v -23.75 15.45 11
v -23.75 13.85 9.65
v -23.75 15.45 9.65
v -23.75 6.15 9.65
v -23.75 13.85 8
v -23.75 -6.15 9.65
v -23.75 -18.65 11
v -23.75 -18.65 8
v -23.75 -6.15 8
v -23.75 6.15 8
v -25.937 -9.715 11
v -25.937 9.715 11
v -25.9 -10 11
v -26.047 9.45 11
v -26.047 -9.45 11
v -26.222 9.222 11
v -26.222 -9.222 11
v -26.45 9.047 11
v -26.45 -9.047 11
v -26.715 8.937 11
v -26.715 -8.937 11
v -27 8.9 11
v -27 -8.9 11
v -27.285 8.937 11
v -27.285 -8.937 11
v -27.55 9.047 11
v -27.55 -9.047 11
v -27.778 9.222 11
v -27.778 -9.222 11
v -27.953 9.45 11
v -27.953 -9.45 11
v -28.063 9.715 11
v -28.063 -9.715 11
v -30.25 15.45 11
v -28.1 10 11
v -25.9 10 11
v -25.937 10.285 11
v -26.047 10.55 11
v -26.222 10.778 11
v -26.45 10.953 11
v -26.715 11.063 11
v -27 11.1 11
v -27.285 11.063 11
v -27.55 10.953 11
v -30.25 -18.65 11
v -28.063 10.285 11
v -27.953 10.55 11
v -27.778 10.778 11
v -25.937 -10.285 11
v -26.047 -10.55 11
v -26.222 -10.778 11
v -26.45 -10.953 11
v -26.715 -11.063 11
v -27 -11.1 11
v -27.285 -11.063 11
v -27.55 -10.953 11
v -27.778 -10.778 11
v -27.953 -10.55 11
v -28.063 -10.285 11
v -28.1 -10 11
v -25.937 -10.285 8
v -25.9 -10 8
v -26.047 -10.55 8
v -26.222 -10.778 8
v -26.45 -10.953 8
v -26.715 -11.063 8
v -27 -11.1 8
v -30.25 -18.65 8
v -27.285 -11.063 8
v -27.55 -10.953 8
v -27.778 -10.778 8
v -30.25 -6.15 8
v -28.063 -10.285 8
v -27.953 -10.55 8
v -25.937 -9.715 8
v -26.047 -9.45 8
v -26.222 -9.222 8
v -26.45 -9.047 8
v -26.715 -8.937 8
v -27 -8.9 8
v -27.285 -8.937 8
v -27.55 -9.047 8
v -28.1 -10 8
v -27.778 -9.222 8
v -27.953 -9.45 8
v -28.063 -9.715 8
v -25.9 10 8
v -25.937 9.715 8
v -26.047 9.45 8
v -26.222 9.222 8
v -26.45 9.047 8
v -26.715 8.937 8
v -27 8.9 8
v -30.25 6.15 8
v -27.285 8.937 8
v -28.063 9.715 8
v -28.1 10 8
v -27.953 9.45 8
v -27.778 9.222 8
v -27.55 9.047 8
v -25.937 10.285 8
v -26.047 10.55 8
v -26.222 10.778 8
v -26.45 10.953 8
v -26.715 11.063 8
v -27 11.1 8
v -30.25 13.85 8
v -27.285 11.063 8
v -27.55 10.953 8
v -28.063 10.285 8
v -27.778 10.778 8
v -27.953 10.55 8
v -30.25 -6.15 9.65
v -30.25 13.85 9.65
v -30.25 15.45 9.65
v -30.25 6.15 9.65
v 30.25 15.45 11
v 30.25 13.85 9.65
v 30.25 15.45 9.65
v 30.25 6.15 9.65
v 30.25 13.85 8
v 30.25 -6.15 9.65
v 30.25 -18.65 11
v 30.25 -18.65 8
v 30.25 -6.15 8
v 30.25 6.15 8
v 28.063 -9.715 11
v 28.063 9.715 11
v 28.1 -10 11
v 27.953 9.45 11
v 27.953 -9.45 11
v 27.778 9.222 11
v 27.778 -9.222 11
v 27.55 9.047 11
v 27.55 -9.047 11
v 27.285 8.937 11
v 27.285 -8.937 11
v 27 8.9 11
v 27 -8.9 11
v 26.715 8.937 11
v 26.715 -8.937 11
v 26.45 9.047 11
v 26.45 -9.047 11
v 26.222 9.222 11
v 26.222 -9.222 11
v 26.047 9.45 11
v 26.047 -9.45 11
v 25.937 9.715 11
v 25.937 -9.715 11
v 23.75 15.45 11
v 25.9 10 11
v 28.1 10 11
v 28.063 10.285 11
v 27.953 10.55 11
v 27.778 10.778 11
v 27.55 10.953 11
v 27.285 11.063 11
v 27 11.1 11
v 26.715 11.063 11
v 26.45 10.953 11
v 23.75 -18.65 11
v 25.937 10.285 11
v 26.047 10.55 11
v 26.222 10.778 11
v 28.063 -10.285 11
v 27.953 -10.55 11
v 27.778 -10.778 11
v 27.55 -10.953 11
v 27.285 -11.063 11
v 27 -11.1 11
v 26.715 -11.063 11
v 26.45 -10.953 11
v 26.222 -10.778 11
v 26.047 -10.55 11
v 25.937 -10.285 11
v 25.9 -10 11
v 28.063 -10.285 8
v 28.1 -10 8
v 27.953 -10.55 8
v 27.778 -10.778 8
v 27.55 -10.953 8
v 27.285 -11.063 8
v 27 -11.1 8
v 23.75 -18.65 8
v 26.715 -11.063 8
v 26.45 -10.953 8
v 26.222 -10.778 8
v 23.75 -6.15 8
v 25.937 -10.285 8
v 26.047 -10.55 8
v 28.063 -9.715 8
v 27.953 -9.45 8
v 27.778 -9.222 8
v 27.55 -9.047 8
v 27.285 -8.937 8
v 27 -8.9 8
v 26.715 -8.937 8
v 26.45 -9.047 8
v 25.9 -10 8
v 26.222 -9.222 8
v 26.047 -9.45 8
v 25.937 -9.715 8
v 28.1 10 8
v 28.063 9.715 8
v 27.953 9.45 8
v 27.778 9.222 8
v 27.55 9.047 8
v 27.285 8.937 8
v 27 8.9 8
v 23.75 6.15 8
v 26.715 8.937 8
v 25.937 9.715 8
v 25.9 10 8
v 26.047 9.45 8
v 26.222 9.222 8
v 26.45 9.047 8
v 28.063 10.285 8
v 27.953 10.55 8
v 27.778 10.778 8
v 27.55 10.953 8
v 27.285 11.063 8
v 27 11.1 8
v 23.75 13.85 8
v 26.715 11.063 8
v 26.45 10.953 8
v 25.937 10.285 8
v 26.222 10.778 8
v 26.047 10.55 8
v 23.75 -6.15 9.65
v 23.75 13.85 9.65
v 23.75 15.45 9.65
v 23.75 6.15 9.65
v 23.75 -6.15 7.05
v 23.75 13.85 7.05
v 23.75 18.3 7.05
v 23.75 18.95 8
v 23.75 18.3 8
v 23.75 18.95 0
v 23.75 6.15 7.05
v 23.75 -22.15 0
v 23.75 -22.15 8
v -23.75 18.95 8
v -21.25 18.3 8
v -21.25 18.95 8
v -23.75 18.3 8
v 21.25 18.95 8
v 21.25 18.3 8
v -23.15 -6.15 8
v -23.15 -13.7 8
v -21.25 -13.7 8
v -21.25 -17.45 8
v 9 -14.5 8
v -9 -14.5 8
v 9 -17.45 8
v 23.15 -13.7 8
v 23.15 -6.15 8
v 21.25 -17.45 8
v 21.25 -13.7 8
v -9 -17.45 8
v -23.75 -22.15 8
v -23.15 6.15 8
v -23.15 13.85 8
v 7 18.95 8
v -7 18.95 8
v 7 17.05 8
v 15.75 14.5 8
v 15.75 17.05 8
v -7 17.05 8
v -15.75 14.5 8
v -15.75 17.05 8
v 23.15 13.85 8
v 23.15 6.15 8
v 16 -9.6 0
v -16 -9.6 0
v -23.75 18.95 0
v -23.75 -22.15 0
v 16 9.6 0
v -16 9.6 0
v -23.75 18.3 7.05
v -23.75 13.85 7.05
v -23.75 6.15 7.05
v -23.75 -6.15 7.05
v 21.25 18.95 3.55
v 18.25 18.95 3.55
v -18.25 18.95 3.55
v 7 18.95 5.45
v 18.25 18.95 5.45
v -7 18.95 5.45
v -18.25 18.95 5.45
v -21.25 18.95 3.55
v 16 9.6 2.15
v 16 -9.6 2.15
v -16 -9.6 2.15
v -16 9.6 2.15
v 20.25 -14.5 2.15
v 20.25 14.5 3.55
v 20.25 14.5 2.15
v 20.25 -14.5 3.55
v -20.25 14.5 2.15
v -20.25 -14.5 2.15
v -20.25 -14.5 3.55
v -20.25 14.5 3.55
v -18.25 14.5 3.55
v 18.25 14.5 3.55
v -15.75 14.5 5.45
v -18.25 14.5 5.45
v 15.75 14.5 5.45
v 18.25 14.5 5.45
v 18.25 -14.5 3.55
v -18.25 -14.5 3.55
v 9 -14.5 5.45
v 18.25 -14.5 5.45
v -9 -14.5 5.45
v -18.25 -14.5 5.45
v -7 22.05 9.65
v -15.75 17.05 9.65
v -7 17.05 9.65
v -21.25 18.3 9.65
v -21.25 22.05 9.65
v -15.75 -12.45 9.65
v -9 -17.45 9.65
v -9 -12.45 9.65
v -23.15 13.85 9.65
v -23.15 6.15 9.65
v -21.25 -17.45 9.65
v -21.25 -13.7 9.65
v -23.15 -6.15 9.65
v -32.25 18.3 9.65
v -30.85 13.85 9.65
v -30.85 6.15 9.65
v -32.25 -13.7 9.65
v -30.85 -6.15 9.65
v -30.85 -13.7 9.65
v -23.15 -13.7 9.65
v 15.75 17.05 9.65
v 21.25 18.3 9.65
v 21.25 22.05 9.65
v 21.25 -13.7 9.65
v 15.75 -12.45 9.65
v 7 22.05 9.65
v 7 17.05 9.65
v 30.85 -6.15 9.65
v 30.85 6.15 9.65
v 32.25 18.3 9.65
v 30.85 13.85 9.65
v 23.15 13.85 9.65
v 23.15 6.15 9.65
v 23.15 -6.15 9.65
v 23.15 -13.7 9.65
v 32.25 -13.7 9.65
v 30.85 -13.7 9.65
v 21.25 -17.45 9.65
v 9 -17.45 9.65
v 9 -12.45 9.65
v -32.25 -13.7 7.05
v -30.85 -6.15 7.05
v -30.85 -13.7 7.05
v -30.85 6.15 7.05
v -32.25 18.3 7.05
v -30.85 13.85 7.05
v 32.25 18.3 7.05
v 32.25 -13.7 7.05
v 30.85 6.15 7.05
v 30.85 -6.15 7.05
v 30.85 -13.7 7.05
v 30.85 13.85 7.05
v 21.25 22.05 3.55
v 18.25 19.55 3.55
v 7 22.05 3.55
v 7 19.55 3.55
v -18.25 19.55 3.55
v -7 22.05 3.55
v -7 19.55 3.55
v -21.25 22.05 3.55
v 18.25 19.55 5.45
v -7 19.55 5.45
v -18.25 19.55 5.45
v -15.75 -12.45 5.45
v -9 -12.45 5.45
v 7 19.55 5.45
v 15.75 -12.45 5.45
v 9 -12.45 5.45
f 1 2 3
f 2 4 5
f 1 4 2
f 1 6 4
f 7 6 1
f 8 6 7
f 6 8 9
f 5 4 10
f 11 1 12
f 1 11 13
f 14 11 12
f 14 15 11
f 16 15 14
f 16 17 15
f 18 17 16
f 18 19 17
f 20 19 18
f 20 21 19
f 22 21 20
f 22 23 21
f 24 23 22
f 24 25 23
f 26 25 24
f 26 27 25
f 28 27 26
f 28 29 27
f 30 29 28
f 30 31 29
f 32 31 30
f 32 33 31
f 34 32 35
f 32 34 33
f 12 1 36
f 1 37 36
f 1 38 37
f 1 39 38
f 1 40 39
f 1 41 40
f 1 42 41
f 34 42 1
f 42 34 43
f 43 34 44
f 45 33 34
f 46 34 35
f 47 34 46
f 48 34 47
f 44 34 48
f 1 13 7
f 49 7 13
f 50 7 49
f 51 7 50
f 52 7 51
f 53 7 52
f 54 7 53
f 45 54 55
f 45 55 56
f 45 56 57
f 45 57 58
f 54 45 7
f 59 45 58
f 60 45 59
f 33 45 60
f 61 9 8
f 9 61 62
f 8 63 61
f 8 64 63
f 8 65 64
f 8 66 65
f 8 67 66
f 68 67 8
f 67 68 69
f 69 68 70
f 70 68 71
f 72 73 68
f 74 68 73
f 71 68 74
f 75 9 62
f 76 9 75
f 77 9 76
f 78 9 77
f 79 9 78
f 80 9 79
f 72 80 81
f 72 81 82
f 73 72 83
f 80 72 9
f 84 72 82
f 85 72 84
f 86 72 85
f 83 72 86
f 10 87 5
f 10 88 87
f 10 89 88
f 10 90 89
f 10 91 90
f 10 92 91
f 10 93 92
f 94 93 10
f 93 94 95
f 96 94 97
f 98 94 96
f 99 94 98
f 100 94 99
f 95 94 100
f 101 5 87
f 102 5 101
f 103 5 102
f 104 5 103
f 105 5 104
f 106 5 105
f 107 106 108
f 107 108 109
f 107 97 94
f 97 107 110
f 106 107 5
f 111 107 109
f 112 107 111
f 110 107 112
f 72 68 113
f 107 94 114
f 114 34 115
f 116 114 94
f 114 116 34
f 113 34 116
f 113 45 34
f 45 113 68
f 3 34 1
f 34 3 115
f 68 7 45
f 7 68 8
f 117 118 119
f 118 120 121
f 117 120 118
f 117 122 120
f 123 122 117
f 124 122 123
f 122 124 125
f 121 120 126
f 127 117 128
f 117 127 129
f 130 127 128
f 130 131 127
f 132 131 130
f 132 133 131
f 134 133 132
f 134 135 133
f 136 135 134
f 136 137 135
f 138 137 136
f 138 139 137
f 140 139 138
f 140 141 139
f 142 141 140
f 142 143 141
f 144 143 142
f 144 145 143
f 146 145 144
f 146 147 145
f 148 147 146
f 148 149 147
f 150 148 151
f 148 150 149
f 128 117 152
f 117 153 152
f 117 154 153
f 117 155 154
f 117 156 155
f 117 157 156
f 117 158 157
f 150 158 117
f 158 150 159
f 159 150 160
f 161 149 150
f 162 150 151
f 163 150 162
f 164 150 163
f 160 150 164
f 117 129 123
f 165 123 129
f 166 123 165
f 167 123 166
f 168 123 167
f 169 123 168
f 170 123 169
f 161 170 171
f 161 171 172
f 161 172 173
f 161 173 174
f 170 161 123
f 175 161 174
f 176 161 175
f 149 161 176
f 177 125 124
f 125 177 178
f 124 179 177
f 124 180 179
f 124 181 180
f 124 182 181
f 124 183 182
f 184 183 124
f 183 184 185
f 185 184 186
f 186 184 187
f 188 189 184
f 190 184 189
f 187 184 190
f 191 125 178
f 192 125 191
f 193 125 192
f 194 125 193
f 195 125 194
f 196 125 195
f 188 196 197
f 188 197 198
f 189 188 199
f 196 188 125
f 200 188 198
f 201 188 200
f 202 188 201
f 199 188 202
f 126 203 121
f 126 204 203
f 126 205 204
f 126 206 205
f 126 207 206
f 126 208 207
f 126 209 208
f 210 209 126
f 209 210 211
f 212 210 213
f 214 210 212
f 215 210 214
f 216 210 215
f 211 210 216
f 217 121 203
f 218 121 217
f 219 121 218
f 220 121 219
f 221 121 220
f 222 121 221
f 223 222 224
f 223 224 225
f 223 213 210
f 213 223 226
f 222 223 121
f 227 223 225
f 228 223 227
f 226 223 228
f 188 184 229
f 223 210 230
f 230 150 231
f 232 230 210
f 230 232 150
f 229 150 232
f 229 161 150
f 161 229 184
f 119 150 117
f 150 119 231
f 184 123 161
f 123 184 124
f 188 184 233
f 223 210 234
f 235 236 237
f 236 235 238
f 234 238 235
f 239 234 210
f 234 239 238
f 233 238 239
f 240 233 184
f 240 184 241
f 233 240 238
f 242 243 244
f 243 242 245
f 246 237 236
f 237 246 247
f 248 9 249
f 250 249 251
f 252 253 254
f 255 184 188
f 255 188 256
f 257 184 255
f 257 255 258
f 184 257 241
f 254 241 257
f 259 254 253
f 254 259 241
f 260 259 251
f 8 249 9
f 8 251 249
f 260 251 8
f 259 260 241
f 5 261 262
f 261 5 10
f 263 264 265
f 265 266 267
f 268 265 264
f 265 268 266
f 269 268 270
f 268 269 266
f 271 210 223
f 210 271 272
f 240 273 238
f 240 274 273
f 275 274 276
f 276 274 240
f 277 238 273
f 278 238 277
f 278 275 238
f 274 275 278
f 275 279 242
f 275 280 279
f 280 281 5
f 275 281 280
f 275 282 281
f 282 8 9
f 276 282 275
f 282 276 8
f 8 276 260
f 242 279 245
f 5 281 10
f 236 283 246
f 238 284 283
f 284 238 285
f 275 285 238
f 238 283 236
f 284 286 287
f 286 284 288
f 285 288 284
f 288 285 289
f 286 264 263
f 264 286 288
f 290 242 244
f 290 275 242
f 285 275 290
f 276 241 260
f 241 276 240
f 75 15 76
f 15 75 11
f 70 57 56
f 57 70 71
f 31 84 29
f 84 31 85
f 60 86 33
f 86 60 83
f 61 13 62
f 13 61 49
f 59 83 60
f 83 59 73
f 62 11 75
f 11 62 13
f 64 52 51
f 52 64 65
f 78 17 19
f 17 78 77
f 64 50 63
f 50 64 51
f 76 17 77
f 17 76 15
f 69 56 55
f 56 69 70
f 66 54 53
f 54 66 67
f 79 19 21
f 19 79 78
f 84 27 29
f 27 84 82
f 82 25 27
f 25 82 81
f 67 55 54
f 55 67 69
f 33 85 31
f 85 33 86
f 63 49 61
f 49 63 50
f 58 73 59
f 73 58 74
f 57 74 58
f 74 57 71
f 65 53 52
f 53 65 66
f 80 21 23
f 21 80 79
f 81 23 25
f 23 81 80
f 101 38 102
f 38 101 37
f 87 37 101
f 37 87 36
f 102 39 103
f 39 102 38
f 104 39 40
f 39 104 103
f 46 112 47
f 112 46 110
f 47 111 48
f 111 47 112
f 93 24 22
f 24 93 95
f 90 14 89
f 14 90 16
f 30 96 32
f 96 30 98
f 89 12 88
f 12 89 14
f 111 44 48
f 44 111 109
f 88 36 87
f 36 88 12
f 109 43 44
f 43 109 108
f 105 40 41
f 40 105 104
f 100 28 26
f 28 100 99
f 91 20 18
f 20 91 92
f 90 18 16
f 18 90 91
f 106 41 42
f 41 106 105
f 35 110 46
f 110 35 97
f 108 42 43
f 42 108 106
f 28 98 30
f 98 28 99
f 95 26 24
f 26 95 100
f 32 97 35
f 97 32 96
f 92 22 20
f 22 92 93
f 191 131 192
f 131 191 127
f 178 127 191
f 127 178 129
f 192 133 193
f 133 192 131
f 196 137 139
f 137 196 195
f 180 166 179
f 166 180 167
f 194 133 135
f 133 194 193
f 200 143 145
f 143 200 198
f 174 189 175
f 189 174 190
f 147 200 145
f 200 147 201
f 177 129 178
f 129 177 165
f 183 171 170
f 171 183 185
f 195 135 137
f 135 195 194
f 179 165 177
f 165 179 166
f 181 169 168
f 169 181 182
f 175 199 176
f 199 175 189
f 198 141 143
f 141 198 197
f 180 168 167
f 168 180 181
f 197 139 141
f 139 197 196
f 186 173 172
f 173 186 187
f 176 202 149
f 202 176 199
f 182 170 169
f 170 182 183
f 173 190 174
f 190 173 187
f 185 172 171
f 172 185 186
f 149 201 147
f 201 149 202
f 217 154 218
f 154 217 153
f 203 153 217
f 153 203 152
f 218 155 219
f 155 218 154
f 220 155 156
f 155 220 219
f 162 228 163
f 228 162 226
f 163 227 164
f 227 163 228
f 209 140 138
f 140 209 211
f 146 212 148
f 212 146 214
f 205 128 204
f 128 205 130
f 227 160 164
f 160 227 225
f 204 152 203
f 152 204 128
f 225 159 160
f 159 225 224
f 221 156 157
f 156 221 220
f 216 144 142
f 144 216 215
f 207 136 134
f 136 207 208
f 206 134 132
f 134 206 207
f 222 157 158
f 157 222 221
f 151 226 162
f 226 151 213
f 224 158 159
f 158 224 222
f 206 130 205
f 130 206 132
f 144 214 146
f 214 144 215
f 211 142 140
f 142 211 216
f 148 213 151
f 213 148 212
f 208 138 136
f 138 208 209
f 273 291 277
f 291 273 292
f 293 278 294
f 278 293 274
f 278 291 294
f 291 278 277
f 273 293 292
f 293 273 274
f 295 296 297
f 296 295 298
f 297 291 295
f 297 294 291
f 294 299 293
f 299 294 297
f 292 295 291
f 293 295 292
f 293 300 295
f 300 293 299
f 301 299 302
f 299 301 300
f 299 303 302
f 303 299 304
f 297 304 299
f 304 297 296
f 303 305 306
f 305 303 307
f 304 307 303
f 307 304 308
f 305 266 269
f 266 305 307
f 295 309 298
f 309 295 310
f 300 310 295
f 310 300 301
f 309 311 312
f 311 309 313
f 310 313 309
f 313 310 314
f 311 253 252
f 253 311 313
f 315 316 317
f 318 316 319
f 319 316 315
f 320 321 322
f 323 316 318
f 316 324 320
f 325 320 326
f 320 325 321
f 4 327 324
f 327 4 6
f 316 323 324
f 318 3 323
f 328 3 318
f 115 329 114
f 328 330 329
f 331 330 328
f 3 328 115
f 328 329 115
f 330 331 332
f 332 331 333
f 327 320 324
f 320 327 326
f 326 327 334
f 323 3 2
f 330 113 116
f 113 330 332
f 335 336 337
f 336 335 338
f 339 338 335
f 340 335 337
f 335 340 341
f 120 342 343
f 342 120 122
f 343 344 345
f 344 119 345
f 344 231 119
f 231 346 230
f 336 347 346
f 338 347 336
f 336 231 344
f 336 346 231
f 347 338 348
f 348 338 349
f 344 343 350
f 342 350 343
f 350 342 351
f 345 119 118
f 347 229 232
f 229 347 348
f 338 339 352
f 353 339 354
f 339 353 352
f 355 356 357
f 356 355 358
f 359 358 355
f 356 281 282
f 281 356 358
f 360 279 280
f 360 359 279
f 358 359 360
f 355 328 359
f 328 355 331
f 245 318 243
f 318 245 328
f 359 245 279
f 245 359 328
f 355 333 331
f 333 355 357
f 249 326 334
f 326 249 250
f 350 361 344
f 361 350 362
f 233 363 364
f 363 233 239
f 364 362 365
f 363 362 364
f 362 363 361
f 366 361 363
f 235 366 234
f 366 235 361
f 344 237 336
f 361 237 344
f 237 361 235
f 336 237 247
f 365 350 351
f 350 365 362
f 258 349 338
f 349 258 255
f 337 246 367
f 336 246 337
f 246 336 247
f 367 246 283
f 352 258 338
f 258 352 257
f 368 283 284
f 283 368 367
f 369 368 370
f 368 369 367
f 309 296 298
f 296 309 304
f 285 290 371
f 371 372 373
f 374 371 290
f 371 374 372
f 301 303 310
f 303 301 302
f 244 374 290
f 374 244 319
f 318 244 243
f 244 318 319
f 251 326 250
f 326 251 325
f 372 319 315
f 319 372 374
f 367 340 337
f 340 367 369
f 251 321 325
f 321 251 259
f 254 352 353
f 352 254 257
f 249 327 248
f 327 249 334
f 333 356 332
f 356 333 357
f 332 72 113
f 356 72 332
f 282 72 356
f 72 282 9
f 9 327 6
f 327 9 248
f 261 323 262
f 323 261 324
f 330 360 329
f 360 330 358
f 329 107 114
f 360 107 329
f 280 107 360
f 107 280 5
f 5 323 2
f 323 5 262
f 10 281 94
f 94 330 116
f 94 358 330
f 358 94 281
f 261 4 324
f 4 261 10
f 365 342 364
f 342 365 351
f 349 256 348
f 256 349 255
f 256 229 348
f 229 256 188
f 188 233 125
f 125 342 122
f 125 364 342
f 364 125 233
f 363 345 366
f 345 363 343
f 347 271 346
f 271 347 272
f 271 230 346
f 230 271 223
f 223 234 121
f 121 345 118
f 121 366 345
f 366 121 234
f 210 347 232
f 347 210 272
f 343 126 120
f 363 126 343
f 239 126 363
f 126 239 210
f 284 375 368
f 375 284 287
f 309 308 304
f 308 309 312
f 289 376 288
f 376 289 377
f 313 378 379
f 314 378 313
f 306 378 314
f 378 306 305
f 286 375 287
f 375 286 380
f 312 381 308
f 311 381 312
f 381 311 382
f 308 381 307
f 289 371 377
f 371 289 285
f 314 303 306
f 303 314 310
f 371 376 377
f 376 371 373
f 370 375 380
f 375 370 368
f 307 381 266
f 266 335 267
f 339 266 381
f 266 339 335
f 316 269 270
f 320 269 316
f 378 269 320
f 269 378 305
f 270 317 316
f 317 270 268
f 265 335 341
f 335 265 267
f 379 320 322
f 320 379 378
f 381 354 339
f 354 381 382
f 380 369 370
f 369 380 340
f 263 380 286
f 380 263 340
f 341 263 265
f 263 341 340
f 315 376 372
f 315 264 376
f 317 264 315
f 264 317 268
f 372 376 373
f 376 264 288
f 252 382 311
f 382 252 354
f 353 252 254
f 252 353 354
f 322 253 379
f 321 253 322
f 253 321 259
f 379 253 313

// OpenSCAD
// =============================================================================
// JARVIS LEGO BOT — FASE D: Prototipo Parametrico Supporto OLED Binghe 1,3"
// Soluzione 2B: Cornice frontale sottile (1,8 mm) + Culla posteriore regolabile
// STATO: PROTOTIPO PARAMETRICO NON VALIDATO (quote provvisorie da confermare)
// =============================================================================

// Seleziona parte da esportare: "assembly", "bezel", "cradle"
part = "assembly";

// --- 1. PARAMETRI PCB (Provvisori: tollera Rev.A 35.4x33.5 e Rev.B 36.0x34.0) ---
pcb_w_min = 35.40;          // [mm] Rev.A (disegno tecnico recente)
pcb_w_max = 36.00;          // [mm] Rev.B (inserzione commerciale)
pcb_h_min = 33.50;          // [mm] Rev.A
pcb_h_max = 34.00;          // [mm] Rev.B
pcb_thickness = 1.60;       // [mm] PROVVISORIO (da confermare con calibro)
rear_smd_protrusion = 2.00; // [mm] PROVVISORIO (componenti SMD retro PCB; NON i 11.30 mm totali!)

// --- 2. PARAMETRI VETRO & AREA ATTIVA ---
glass_w = 34.50;            // [mm]
glass_h = 23.00;            // [mm]
glass_thickness = 1.40;     // [mm] PROVVISORIO
active_w = 29.42;           // [mm] (128 px)
active_h = 14.70;           // [mm] (64 px)
active_top_offset = 7.35;   // [mm] da bordo superiore PCB (asimmetrico -> centro area a 14.70 mm)

// --- 3. PARAMETRI FORI PCB (solo riferimento, NON usati per incastro rigido) ---
hole_pitch_x_min = 30.40;   // [mm] Rev.A
hole_pitch_x_max = 31.00;   // [mm] Rev.B
hole_pitch_y = 28.50;       // [mm] Rev.A
hole_dia = 3.00;            // [mm]

// --- 4. PARAMETRI CORNICE & FINESTRA LEGO (Soluzione 2B) ---
pocket_w = 48.00;           // [mm] Tasca LEGO frontale (6 stud)
pocket_h = 41.60;           // [mm] Tasca LEGO frontale (13 plate: Y_h = 25.6..67.2 mm)
lego_wall_z = 8.00;         // [mm] Spessore parete LEGO (1 stud)
window_w = 32.00;           // [mm] Finestra netta visibile (invariata)
window_h = 19.20;           // [mm] Finestra netta visibile (invariata)
recess_depth = 1.80;        // [mm] Incasso frontale nominale pannello
glass_relief = 0.35;        // [mm] Scarico aria davanti al vetro (nessuna pressione!)

// --- 5. PARAMETRI STAMPA 3D & REGOLAZIONE CULLA ---
print_tol_xy = 0.25;        // [mm] Gioco FDM XY per lato
print_tol_z = 0.20;         // [mm] Gioco Z
slot_travel = 2.50;         // [mm] Corsa di regolazione fine ±2.5 mm su X e Y
screw_dia = 2.70;           // [mm] Foro asola per vite M2.5 (o perno isolato)
flange_w = 6.50;            // [mm] Alette laterali dietro i mattoncini 3004
flange_t = 3.00;            // [mm] Spessore flangia bloccaggio senza colla

// --- 6. PARAMETRI CONNETTORE 4 PIN & FLEX INFERIORE ---
// Nota: 11.30 mm in vista laterale = vetro(1.4) + PCB(1.6) + header/pin(~8.3)
header_w = 14.00;           // [mm] Larghezza scasso header superiore
header_h = 7.00;            // [mm] Altezza libera superiore per pin/cavi
header_protrusion = 8.30;   // [mm] PROVVISORIO (derivato da 11.30 - 1.40 - 1.60)
flex_relief_w = 18.00;      // [mm] Larghezza scasso protezione flex inferiore
flex_relief_d = 3.50;       // [mm] Profondita scarico flex inferiore

// =============================================================================
// MODULO 1: CORNICE FRONTALE SOTTILE (SOLUZIONE 2B)
// Sistema coordinate: X centrato su finestra, Y centrato su finestra, Z=0 fronte
// =============================================================================
module oled_bezel() {
    outer_w = pocket_w - 2 * print_tol_xy;
    outer_h = pocket_h - 2 * print_tol_xy;
    // Tasca LEGO Y_h = 25.6..67.2 mm (centro 46.4 mm -> -1.60 mm rispetto al centro finestra 48.0 mm)
    pocket_y_off = -1.60;
    // Scarico interno dietro il labbro da 1.8 mm per alloggiare vetro + PCB senza pressione
    cavity_w = glass_w + 2 * slot_travel + 1.0; // ~40.5 mm (libero per regolazione +-2.5)
    cavity_h = glass_h + 2 * slot_travel + 1.0; // ~29.0 mm

    difference() {
        union() {
            // Corpo principale inserito nella tasca LEGO 48 x 41.6 mm (Z=0..8 mm)
            translate([-outer_w/2, pocket_y_off - outer_h/2, 0])
                cube([outer_w, outer_h, lego_wall_z]);

            // Flange laterali posteriori per bloccaggio meccanico dietro 3004 (Z=8..11 mm)
            for (sx = [-1, 1]) {
                translate([sx * (outer_w/2) - (sx > 0 ? 0 : flange_w), pocket_y_off - outer_h/2 + 3.5, lego_wall_z])
                    cube([flange_w, outer_h - 7.0, flange_t]);
            }
        }

        // 1. Apertura finestra netta frontale (32.0 x 19.2 mm)
        translate([-window_w/2, -window_h/2, -0.5])
            cube([window_w, window_h, recess_depth + 1.0]);

        // 2. Cavità posteriore libera per vetro (zero pressione!) e regolazione +-2.5 mm
        translate([-cavity_w/2, -cavity_h/2, recess_depth + glass_relief])
            cube([cavity_w, cavity_h, lego_wall_z + flange_t]);

        // 3. Fori di fissaggio/accoppiamento per viti M2.5 della culla sulle flange laterali
        for (sx = [-1, 1], sy = [-1, 1]) {
            translate([sx * (outer_w/2 + flange_w/2), sy * 10.0, lego_wall_z - 1.0])
                cylinder(h = flange_t + 2.0, d = 2.2, $fn = 24);
        }
    }
}

// =============================================================================
// MODULO 2: CULLA POSTERIORE REGOLABILE (±2.5 mm su X e Y, tollera 35.4..36.0)
// =============================================================================
module oled_cradle() {
    // Tasca dimensionata su pcb_w_max / pcb_h_max + tolleranza stampa
    pocket_pcb_w = pcb_w_max + 2 * print_tol_xy;
    pocket_pcb_h = pcb_h_max + 2 * print_tol_xy;
    cradle_w = pocket_pcb_w + 6.0; // ~42.5 mm
    cradle_h = pocket_pcb_h + 5.0; // ~39.5 mm
    cradle_z0 = recess_depth + glass_relief + glass_thickness; // ~3.55 mm
    cradle_depth = pcb_thickness + rear_smd_protrusion + 2.5;  // ~6.1 mm

    // Offset verticale centro PCB rispetto a centro finestra (7.35 mm + 14.70/2 = 14.70 mm da top)
    pcb_y_offset = (pcb_h_max / 2) - (active_top_offset + active_h / 2); // -2.30 mm

    translate([0, pcb_y_offset, cradle_z0])
    difference() {
        union() {
            // Telaio culla perimetrale
            translate([-cradle_w/2, -cradle_h/2, 0])
                cube([cradle_w, cradle_h, cradle_depth]);

            // Alette asolate laterali per aggancio alle flange della cornice
            for (sx = [-1, 1]) {
                ax = (sx > 0) ? (cradle_w/2 - 1.0) : (-cradle_w/2 - 11.0);
                translate([ax, -16.0, cradle_depth - 2.6])
                    cube([12.0, 32.0, 2.6]);
            }
        }

        // 1. Alloggiamento PCB (tollera 35.4..36.0 x 33.5..34.0 senza forzare)
        translate([-pocket_pcb_w/2, -pocket_pcb_h/2, -0.5])
            cube([pocket_pcb_w, pocket_pcb_h, pcb_thickness + 0.8]);

        // 2. Finestra posteriore aperta per componenti SMD, dissipazione e zero cortocircuiti
        translate([-(pocket_pcb_w - 5.0)/2, -(pocket_pcb_h - 5.0)/2, -0.5])
            cube([pocket_pcb_w - 5.0, pocket_pcb_h - 5.0, cradle_depth + 1.0]);

        // 3. Scasso aperto superiore per connettore I2C 4 pin
        translate([-header_w/2, pocket_pcb_h/2 - 4.0, -0.5])
            cube([header_w, header_h + 5.0, cradle_depth + 1.0]);

        // 4. Scarico inferiore aperto per protezione nastro flex FPC
        translate([-flex_relief_w/2, -cradle_h/2 - 0.5, -0.5])
            cube([flex_relief_w, flex_relief_d + 2.5, cradle_depth + 1.0]);

        // 5. Finestre asolate di regolazione indipendente ±2.5 mm su X e Y (con rondella M2.5)
        for (sx = [-1, 1], sy = [-1, 1]) {
            cx = sx * ((pocket_w - 2*print_tol_xy)/2 + flange_w/2);
            cy = sy * 10.0 - pcb_y_offset;
            translate([cx - slot_travel - screw_dia/2, cy - slot_travel - screw_dia/2, -1])
                cube([2*slot_travel + screw_dia, 2*slot_travel + screw_dia, cradle_depth + 2]);
        }
    }
}

if (part == "bezel") {
    oled_bezel();
} else if (part == "cradle") {
    oled_cradle();
} else {
    color("#1e2229") oled_bezel();
    color("#607d8b") oled_cradle();
}
